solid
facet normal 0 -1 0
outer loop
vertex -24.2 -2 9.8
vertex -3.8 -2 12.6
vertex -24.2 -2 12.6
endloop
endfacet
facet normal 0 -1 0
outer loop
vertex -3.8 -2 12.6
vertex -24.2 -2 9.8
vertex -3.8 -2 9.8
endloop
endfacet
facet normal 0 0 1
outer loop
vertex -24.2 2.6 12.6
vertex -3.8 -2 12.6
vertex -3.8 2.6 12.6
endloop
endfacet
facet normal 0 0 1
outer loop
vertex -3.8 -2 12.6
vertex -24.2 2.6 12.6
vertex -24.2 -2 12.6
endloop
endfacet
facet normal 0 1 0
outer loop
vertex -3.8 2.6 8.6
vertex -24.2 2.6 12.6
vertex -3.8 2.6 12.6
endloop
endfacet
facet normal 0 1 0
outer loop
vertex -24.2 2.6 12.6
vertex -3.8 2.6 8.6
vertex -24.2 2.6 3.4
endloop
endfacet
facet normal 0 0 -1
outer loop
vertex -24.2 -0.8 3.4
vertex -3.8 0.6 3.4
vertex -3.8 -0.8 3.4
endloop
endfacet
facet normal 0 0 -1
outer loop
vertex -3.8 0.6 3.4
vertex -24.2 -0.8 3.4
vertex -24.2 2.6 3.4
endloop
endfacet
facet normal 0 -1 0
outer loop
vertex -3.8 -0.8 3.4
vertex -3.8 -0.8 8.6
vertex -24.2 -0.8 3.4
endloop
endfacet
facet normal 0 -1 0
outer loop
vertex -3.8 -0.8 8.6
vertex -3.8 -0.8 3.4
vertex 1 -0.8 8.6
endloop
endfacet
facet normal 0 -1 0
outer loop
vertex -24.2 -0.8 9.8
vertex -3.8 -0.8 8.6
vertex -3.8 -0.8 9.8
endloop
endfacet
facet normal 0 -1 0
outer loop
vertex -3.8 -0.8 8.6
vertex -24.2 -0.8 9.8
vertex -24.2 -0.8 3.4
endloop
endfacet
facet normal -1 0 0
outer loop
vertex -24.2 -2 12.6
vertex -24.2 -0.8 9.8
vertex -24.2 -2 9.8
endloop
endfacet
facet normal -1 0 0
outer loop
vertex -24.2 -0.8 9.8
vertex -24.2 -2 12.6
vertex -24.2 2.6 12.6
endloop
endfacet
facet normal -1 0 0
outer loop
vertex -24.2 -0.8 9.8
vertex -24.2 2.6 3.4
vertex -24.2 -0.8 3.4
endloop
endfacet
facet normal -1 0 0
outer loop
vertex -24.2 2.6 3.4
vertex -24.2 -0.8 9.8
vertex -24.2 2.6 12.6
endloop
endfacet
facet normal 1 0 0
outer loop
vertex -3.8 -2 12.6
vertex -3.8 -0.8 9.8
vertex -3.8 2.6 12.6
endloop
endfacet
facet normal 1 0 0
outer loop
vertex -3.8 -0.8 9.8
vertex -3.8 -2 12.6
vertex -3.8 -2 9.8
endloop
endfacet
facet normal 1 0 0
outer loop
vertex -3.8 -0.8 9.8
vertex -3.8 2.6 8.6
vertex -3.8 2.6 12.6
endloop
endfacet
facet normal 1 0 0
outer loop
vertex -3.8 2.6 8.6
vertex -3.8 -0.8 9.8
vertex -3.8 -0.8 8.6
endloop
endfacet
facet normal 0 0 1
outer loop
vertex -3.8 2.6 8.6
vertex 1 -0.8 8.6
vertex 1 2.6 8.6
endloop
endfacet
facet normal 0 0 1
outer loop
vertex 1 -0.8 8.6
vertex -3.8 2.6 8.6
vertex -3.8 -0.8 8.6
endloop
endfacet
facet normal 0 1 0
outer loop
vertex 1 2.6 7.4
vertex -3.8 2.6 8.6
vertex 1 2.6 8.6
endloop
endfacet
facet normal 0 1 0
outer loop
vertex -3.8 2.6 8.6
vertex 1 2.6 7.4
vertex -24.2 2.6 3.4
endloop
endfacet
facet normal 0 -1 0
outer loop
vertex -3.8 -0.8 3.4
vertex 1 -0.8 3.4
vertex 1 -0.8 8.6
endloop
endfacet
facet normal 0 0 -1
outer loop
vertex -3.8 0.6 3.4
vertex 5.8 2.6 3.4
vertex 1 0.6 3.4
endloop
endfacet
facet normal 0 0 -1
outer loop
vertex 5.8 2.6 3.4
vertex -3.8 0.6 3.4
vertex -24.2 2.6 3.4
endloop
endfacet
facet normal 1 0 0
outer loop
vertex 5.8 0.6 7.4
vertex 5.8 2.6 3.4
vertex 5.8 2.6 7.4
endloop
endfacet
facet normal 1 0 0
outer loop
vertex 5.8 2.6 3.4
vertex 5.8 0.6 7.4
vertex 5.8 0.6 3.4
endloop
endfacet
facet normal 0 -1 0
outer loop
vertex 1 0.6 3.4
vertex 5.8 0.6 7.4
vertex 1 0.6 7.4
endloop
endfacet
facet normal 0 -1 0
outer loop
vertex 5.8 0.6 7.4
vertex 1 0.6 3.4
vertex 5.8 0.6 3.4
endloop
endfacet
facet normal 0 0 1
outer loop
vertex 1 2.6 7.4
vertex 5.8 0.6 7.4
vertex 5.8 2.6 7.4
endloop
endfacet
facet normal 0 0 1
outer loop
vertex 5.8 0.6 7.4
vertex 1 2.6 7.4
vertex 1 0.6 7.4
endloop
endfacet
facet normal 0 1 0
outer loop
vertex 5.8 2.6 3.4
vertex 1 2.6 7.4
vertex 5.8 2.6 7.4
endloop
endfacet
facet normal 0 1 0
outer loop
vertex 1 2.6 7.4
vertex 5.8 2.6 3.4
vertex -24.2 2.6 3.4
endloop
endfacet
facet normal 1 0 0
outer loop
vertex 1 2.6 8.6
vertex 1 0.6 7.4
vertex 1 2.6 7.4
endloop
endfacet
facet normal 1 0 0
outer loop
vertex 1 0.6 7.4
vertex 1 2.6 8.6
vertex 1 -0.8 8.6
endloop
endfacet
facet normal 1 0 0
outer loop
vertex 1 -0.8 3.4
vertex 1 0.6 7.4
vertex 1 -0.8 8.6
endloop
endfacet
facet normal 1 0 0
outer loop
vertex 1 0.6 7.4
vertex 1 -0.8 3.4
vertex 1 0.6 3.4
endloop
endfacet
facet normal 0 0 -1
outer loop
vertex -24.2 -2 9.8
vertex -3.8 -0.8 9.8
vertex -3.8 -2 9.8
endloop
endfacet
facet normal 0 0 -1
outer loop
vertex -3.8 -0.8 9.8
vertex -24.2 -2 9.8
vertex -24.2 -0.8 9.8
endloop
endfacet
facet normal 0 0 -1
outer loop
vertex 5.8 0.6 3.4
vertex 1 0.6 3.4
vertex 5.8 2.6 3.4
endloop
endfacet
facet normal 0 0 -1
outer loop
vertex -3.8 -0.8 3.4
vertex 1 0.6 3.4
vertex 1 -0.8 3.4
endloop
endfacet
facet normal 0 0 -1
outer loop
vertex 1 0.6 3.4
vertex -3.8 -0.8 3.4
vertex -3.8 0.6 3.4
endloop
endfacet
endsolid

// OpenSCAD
// file: ../p/rect3.scad
use <../lib.scad>
function ldraw_lib__rect3() = [
// 0 Rectangle with 3 Edges
// 0 Name: rect3.dat
// 0 Author: Mark Kennedy [mkennedy]
// 0 !LDRAW_ORG Primitive UPDATE 2010-01
// 0 !LICENSE Licensed under CC BY 4.0 : see CAreadme.txt
// 
// 0 BFC CERTIFY CCW
  [0,"BFC","CERTIFY"],
  [0,"BFC","CCW"],
// 
// 0 !HISTORY 2003-08-01 [PTadmin] Official Update 2003-02
// 0 !HISTORY 2007-06-24 [PTadmin] Header formatted for Contributor Agreement
// 0 !HISTORY 2008-07-01 [PTadmin] Official Update 2008-01
// 0 !HISTORY 2010-01-17 [mikeheide] Change winding to CCW
// 0 !HISTORY 2010-04-05 [PTadmin] Official Update 2010-01
// 
// 
// 2 24 1 0 1 -1 0 1
  [2,24,1,0,1,-1,0,1],
// 2 24 1 0 1 1 0 -1
  [2,24,1,0,1,1,0,-1],
// 2 24 -1 0 1 -1 0 -1
  [2,24,-1,0,1,-1,0,-1],
// 4 16 -1 0 1 -1 0 -1 1 0 -1 1 0 1
  [4,16,-1,0,1,-1,0,-1,1,0,-1,1,0,1],
// 0 //
];
module ldraw_lib__rect3(step=0, col=false, unit=2/5, alt=false, line=0.2, solid=!$preview)
    makepoly(ldraw_lib__rect3(), step=step, col=col, unit=unit, alt=alt, line=line, solid=solid);
ldraw_lib__rect3(line=0.2);
// file: ../p/rect.scad
use <../lib.scad>
function ldraw_lib__rect() = [
// 0 Rectangle
// 0 Name: rect.dat
// 0 Author: James Jessiman
// 0 !LDRAW_ORG Primitive UPDATE 2010-01
// 0 !LICENSE Licensed under CC BY 2.0 and CC BY 4.0 : see CAreadme.txt
// 
// 0 BFC CERTIFY CCW
  [0,"BFC","CERTIFY"],
  [0,"BFC","CCW"],
// 
// 0 !HISTORY 2002-04-05 [hafhead] Added BFC statement
// 0 !HISTORY 2002-04-25 [PTadmin] Official Update 2002-02
// 0 !HISTORY 2007-06-24 [PTadmin] Header formatted for Contributor Agreement
// 0 !HISTORY 2008-07-01 [PTadmin] Official Update 2008-01
// 0 !HISTORY 2010-01-17 [mikeheide] changed winding to CCW
// 0 !HISTORY 2010-04-05 [PTadmin] Official Update 2010-01
// 
// 
// 2 24 1 0 1 -1 0 1
  [2,24,1,0,1,-1,0,1],
// 2 24 -1 0 1 -1 0 -1
  [2,24,-1,0,1,-1,0,-1],
// 2 24 -1 0 -1 1 0 -1
  [2,24,-1,0,-1,1,0,-1],
// 2 24 1 0 -1 1 0 1
  [2,24,1,0,-1,1,0,1],
// 4 16 -1 0 1 -1 0 -1 1 0 -1 1 0 1
  [4,16,-1,0,1,-1,0,-1,1,0,-1,1,0,1],
// 0
];
module ldraw_lib__rect(step=0, col=false, unit=2/5, alt=false, line=0.2, solid=!$preview)
    makepoly(ldraw_lib__rect(), step=step, col=col, unit=unit, alt=alt, line=line, solid=solid);
ldraw_lib__rect(line=0.2);
// file: ../p/box3-3.scad
use <../lib.scad>
function ldraw_lib__box3_3() = [
// 0 Box with 3 Adjacent Faces and 3 Missing Edges
// 0 Name: box3-3.dat
// 0 Author: Mark Kennedy [mkennedy]
// 0 !LDRAW_ORG Primitive UPDATE 2004-03
// 0 !LICENSE Licensed under CC BY 4.0 : see CAreadme.txt
// 
// 0 BFC CERTIFY CCW
  [0,"BFC","CERTIFY"],
  [0,"BFC","CCW"],
// 
// 0 !HISTORY 2004-09-15 [PTadmin] Official Update 2004-03
// 0 !HISTORY 2007-06-24 [PTadmin] Header formatted for Contributor Agreement
// 0 !HISTORY 2008-07-01 [PTadmin] Official Update 2008-01
// 
// 
// 2 24 1 1 1 -1 1 1
  [2,24,1,1,1,-1,1,1],
// 2 24 -1 1 1 -1 1 -1
  [2,24,-1,1,1,-1,1,-1],
// 2 24 -1 1 -1 1 1 -1
  [2,24,-1,1,-1,1,1,-1],
// 2 24 1 1 -1 1 1 1
  [2,24,1,1,-1,1,1,1],
// 2 24 1 -1 1 -1 -1 1
  [2,24,1,-1,1,-1,-1,1],
// 2 24 1 -1 -1 1 -1 1
  [2,24,1,-1,-1,1,-1,1],
// 2 24 1 -1 1 1 1 1
  [2,24,1,-1,1,1,1,1],
// 2 24 -1 -1 1 -1 1 1
  [2,24,-1,-1,1,-1,1,1],
// 2 24 1 -1 -1 1 1 -1
  [2,24,1,-1,-1,1,1,-1],
// 0
// 4 16 1 1 1 1 1 -1 -1 1 -1 -1 1 1
  [4,16,1,1,1,1,1,-1,-1,1,-1,-1,1,1],
// 4 16 1 1 1 1 -1 1 1 -1 -1 1 1 -1
  [4,16,1,1,1,1,-1,1,1,-1,-1,1,1,-1],
// 4 16 1 1 1 -1 1 1 -1 -1 1 1 -1 1
  [4,16,1,1,1,-1,1,1,-1,-1,1,1,-1,1],
// 0
// 
];
module ldraw_lib__box3_3(step=0, col=false, unit=2/5, alt=false, line=0.2, solid=!$preview)
    makepoly(ldraw_lib__box3_3(), step=step, col=col, unit=unit, alt=alt, line=line, solid=solid);
ldraw_lib__box3_3(line=0.2);
// file: ../p/box2-5.scad
use <../lib.scad>
function ldraw_lib__box2_5() = [
// 0 Box with 2 Faces without 5 Edges
// 0 Name: box2-5.dat
// 0 Author: Steffen [Steffen]
// 0 !LDRAW_ORG Primitive UPDATE 2003-03
// 0 !LICENSE Licensed under CC BY 4.0 : see CAreadme.txt
// 
// 0 BFC CERTIFY CCW
  [0,"BFC","CERTIFY"],
  [0,"BFC","CCW"],
// 
// 0 !HISTORY 2003-12-19 [PTadmin] Official Update 2003-03
// 0 !HISTORY 2007-06-24 [PTadmin] Header formatted for Contributor Agreement
// 0 !HISTORY 2008-07-01 [PTadmin] Official Update 2008-01
// 
// 
// 2 24 1 1 1 -1 1 1
  [2,24,1,1,1,-1,1,1],
// 2 24 1 1 -1 -1 1 -1
  [2,24,1,1,-1,-1,1,-1],
// 2 24 1 -1 1 -1 -1 1
  [2,24,1,-1,1,-1,-1,1],
// 2 24 -1 -1 1 -1 1 1
  [2,24,-1,-1,1,-1,1,1],
// 2 24 1 -1 1 1 1 1
  [2,24,1,-1,1,1,1,1],
// 2 24 -1 1 -1 -1 1 1
  [2,24,-1,1,-1,-1,1,1],
// 2 24 1 1 -1 1 1 1
  [2,24,1,1,-1,1,1,1],
// 4 16 1 1 1 1 1 -1 -1 1 -1 -1 1 1
  [4,16,1,1,1,1,1,-1,-1,1,-1,-1,1,1],
// 4 16 1 1 1 -1 1 1 -1 -1 1 1 -1 1
  [4,16,1,1,1,-1,1,1,-1,-1,1,1,-1,1],
// 0
];
module ldraw_lib__box2_5(step=0, col=false, unit=2/5, alt=false, line=0.2, solid=!$preview)
    makepoly(ldraw_lib__box2_5(), step=step, col=col, unit=unit, alt=alt, line=line, solid=solid);
ldraw_lib__box2_5(line=0.2);
// file: s/822s02.scad
use <../../lib.scad>
use <../../p/box2-5.scad>
use <../../p/box3-3.scad>
use <../../p/rect.scad>
use <../../p/rect3.scad>
function ldraw_lib__s__822s02() = [
// 0 ~Garage Door Counterweight without Hinge Pin
// 0 Name: s\822s02.dat
// 0 Author: J.C. Tchang [tchang]
// 0 !LDRAW_ORG Subpart UPDATE 2020-03
// 0 !LICENSE Licensed under CC BY 4.0 : see CAreadme.txt
// 
// 0 BFC CERTIFY CCW
  [0,"BFC","CERTIFY"],
  [0,"BFC","CCW"],
// 
// 0 !HISTORY 2010-01-17 [mikeheide] substituted stud.dat with 4-4cylc.dat, updated header
// 0 !HISTORY 2011-05-14 [Steffen] restructured files 822.dat, 823.dat
// 0 !HISTORY 2017-12-23 [MagFors] removed hingepin
// 0 !HISTORY 2020-12-29 [PTadmin] Official Update 2020-03
// 
// 
// 2 24 14.5 -8.5 -6.5 -60.5 -8.5 -6.5
  [2,24,14.5,-8.5,-6.5,-60.5,-8.5,-6.5],
// 2 24 2.5 -18.5 -6.5 2.5 -21.5 -6.5
  [2,24,2.5,-18.5,-6.5,2.5,-21.5,-6.5],
// 2 24 2.5 -21.5 2 2.5 -8.5 2
  [2,24,2.5,-21.5,2,2.5,-8.5,2],
// 2 24 -9.5 -21.5 -6.5 -9.5 -31.5 -6.5
  [2,24,-9.5,-21.5,-6.5,-9.5,-31.5,-6.5],
// 2 24 -9.5 -21.5 2 -9.5 -24.5 2
  [2,24,-9.5,-21.5,2,-9.5,-24.5,2],
// 2 24 -9.5 -8.5 2 -60.5 -8.5 2
  [2,24,-9.5,-8.5,2,-60.5,-8.5,2],
// 2 24 -60.5 -31.5 -6.5 -60.5 -8.5 -6.5
  [2,24,-60.5,-31.5,-6.5,-60.5,-8.5,-6.5],
// 2 24 -60.5 -24.5 2 -60.5 -8.5 2
  [2,24,-60.5,-24.5,2,-60.5,-8.5,2],
// 2 24 -60.5 -8.5 2 -60.5 -8.5 -6.5
  [2,24,-60.5,-8.5,2,-60.5,-8.5,-6.5],
// 1 16 -35 -28 -0.75 -25.5 0 0 0 0 -3.5 0 5.75 0 box2-5.dat
  [1,16,-35,-28,-0.75,-25.5,0,0,0,0,-3.5,0,5.75,0, ldraw_lib__box2_5()],
// 4 16 -9.5 -21.5 -6.5 -9.5 -31.5 -6.5 -60.5 -31.5 -6.5 -60.5 -8.5 -6.5
  [4,16,-9.5,-21.5,-6.5,-9.5,-31.5,-6.5,-60.5,-31.5,-6.5,-60.5,-8.5,-6.5],
// 4 16 -60.5 -8.5 2 -9.5 -8.5 2 -9.5 -8.5 -1.5 -60.5 -8.5 -6.5
  [4,16,-60.5,-8.5,2,-9.5,-8.5,2,-9.5,-8.5,-1.5,-60.5,-8.5,-6.5],
// 4 16 2.5 -21.5 2 -9.5 -8.5 2 -60.5 -8.5 2 -9.5 -21.5 2
  [4,16,2.5,-21.5,2,-9.5,-8.5,2,-60.5,-8.5,2,-9.5,-21.5,2],
// 4 16 -60.5 -8.5 2 -60.5 -24.5 2 -9.5 -24.5 2 -9.5 -21.5 2
  [4,16,-60.5,-8.5,2,-60.5,-24.5,2,-9.5,-24.5,2,-9.5,-21.5,2],
// 4 16 -60.5 -31.5 -6.5 -60.5 -31.5 5 -60.5 -24.5 5 -60.5 -24.5 2
  [4,16,-60.5,-31.5,-6.5,-60.5,-31.5,5,-60.5,-24.5,5,-60.5,-24.5,2],
// 4 16 -60.5 -8.5 -6.5 -60.5 -31.5 -6.5 -60.5 -24.5 2 -60.5 -8.5 2
  [4,16,-60.5,-8.5,-6.5,-60.5,-31.5,-6.5,-60.5,-24.5,2,-60.5,-8.5,2],
// 4 16 -9.5 -24.5 2 -9.5 -24.5 5 -9.5 -31.5 5 -9.5 -31.5 -6.5
  [4,16,-9.5,-24.5,2,-9.5,-24.5,5,-9.5,-31.5,5,-9.5,-31.5,-6.5],
// 4 16 -9.5 -21.5 2 -9.5 -24.5 2 -9.5 -31.5 -6.5 -9.5 -21.5 -6.5
  [4,16,-9.5,-21.5,2,-9.5,-24.5,2,-9.5,-31.5,-6.5,-9.5,-21.5,-6.5],
// 1 16 -3.5 -21.5 -2.25 -6 0 0 0 1 0 0 0 -4.25 rect.dat
  [1,16,-3.5,-21.5,-2.25,-6,0,0,0,1,0,0,0,-4.25, ldraw_lib__rect()],
// 4 16 2.5 -18.5 -6.5 2.5 -21.5 -6.5 -9.5 -21.5 -6.5 -60.5 -8.5 -6.5
  [4,16,2.5,-18.5,-6.5,2.5,-21.5,-6.5,-9.5,-21.5,-6.5,-60.5,-8.5,-6.5],
// 3 16 2.5 -21.5 2 2.5 -8.5 2 -9.5 -8.5 2
  [3,16,2.5,-21.5,2,2.5,-8.5,2,-9.5,-8.5,2],
// 4 16 -9.5 -8.5 -1.5 2.5 -8.5 -1.5 14.5 -8.5 -6.5 -60.5 -8.5 -6.5
  [4,16,-9.5,-8.5,-1.5,2.5,-8.5,-1.5,14.5,-8.5,-6.5,-60.5,-8.5,-6.5],
// 1 16 8.5 -13.5 -4 0 6 0 0 0 -5 2.5 0 0 box3-3.dat
  [1,16,8.5,-13.5,-4,0,6,0,0,0,-5,2.5,0,0, ldraw_lib__box3_3()],
// 4 16 14.5 -8.5 -6.5 14.5 -18.5 -6.5 2.5 -18.5 -6.5 -60.5 -8.5 -6.5
  [4,16,14.5,-8.5,-6.5,14.5,-18.5,-6.5,2.5,-18.5,-6.5,-60.5,-8.5,-6.5],
// 4 16 2.5 -18.5 -6.5 2.5 -18.5 -1.5 2.5 -21.5 2 2.5 -21.5 -6.5
  [4,16,2.5,-18.5,-6.5,2.5,-18.5,-1.5,2.5,-21.5,2,2.5,-21.5,-6.5],
// 4 16 2.5 -8.5 -1.5 2.5 -8.5 2 2.5 -21.5 2 2.5 -18.5 -1.5
  [4,16,2.5,-8.5,-1.5,2.5,-8.5,2,2.5,-21.5,2,2.5,-18.5,-1.5],
// 1 16 -35 -24.5 3.5 25.5 0 0 0 -1 0 0 0 -1.5 rect3.dat
  [1,16,-35,-24.5,3.5,25.5,0,0,0,-1,0,0,0,-1.5, ldraw_lib__rect3()],
// 3 16 14.5 -8.5 -6.5 2.5 -8.5 -1.5 14.5 -8.5 -1.5
  [3,16,14.5,-8.5,-6.5,2.5,-8.5,-1.5,14.5,-8.5,-1.5],
];
module ldraw_lib__s__822s02(step=0, col=false, unit=2/5, alt=false, line=0.2, solid=!$preview)
    makepoly(ldraw_lib__s__822s02(), step=step, col=col, unit=unit, alt=alt, line=line, solid=solid);
ldraw_lib__s__822s02(line=0.2);
// file: ../p/rect2a.scad
use <../lib.scad>
function ldraw_lib__rect2a() = [
// 0 Rectangle with 2 Adjacent Edges
// 0 Name: rect2a.dat
// 0 Author: Chris Dee [cwdee]
// 0 !LDRAW_ORG Primitive UPDATE 2010-01
// 0 !LICENSE Licensed under CC BY 4.0 : see CAreadme.txt
// 
// 0 BFC CERTIFY CCW
  [0,"BFC","CERTIFY"],
  [0,"BFC","CCW"],
// 
// 0 !HISTORY 2003-12-19 [PTadmin] Official Update 2003-03
// 0 !HISTORY 2007-06-24 [PTadmin] Header formatted for Contributor Agreement
// 0 !HISTORY 2008-07-01 [PTadmin] Official Update 2008-01
// 0 !HISTORY 2010-01-17 [mikeheide] changed winding to CCW
// 0 !HISTORY 2010-04-05 [PTadmin] Official Update 2010-01
// 
// 
// 2 24 1 0 1 -1 0 1
  [2,24,1,0,1,-1,0,1],
// 2 24 1 0 -1 1 0 1
  [2,24,1,0,-1,1,0,1],
// 4 16 -1 0 1 -1 0 -1 1 0 -1 1 0 1
  [4,16,-1,0,1,-1,0,-1,1,0,-1,1,0,1],
// 0
];
module ldraw_lib__rect2a(step=0, col=false, unit=2/5, alt=false, line=0.2, solid=!$preview)
    makepoly(ldraw_lib__rect2a(), step=step, col=col, unit=unit, alt=alt, line=line, solid=solid);
ldraw_lib__rect2a(line=0.2);
// file: u9187c.scad
use <../lib.scad>
use <../p/rect2a.scad>
use <s/822s02.scad>
function ldraw_lib__u9187c() = [
// 0 ~Garage Door Counterweight Right without Hinge Pin
// 0 Name: u9187c.dat
// 0 Author: Magnus Forsberg [MagFors]
// 0 !LDRAW_ORG Part UPDATE 2020-03
// 0 !LICENSE Licensed under CC BY 4.0 : see CAreadme.txt
// 
// 0 BFC CERTIFY CCW
  [0,"BFC","CERTIFY"],
  [0,"BFC","CCW"],
// 
// 0 !HISTORY 2020-12-29 [PTadmin] Official Update 2020-03
// 
// 
// 1 16 0 0 0 1 0 0 0 1 0 0 0 1 s\822s02.dat
  [1,16,0,0,0,1,0,0,0,1,0,0,0,1, ldraw_lib__s__822s02()],
// 1 16 -3.5 -8.5 .25 0 0 6 0 -1 0 1.75 0 0 rect2a.dat
  [1,16,-3.5,-8.5,.25,0,0,6,0,-1,0,1.75,0,0, ldraw_lib__rect2a()],
];
module ldraw_lib__u9187c(step=0, col=false, unit=2/5, alt=false, line=0.2, solid=!$preview)
    makepoly(ldraw_lib__u9187c(), step=step, col=col, unit=unit, alt=alt, line=line, solid=solid);
ldraw_lib__u9187c(line=0.2);
// main file
use <../lib.scad>
use <u9187c.scad>
function ldraw_lib__u9187d() = [
// 0 ~Garage Door Counterweight Left without Hinge Pin
// 0 Name: u9187d.dat
// 0 Author: Magnus Forsberg [MagFors]
// 0 !LDRAW_ORG Part UPDATE 2020-03
// 0 !LICENSE Licensed under CC BY 4.0 : see CAreadme.txt
// 
// 0 BFC CERTIFY CCW
  [0,"BFC","CERTIFY"],
  [0,"BFC","CCW"],
// 
// 0 !HISTORY 2020-12-29 [PTadmin] Official Update 2020-03
// 
// 
// 1 16 0 0 0 1 0 0 0 1 0 0 0 -1 u9187c.dat
  [1,16,0,0,0,1,0,0,0,1,0,0,0,-1, ldraw_lib__u9187c()],
];
module ldraw_lib__u9187d(step=0, col=false, unit=2/5, alt=false, line=0.2, solid=!$preview)
    makepoly(ldraw_lib__u9187d(), step=step, col=col, unit=unit, alt=alt, line=line, solid=solid);
ldraw_lib__u9187d(line=0.2);
